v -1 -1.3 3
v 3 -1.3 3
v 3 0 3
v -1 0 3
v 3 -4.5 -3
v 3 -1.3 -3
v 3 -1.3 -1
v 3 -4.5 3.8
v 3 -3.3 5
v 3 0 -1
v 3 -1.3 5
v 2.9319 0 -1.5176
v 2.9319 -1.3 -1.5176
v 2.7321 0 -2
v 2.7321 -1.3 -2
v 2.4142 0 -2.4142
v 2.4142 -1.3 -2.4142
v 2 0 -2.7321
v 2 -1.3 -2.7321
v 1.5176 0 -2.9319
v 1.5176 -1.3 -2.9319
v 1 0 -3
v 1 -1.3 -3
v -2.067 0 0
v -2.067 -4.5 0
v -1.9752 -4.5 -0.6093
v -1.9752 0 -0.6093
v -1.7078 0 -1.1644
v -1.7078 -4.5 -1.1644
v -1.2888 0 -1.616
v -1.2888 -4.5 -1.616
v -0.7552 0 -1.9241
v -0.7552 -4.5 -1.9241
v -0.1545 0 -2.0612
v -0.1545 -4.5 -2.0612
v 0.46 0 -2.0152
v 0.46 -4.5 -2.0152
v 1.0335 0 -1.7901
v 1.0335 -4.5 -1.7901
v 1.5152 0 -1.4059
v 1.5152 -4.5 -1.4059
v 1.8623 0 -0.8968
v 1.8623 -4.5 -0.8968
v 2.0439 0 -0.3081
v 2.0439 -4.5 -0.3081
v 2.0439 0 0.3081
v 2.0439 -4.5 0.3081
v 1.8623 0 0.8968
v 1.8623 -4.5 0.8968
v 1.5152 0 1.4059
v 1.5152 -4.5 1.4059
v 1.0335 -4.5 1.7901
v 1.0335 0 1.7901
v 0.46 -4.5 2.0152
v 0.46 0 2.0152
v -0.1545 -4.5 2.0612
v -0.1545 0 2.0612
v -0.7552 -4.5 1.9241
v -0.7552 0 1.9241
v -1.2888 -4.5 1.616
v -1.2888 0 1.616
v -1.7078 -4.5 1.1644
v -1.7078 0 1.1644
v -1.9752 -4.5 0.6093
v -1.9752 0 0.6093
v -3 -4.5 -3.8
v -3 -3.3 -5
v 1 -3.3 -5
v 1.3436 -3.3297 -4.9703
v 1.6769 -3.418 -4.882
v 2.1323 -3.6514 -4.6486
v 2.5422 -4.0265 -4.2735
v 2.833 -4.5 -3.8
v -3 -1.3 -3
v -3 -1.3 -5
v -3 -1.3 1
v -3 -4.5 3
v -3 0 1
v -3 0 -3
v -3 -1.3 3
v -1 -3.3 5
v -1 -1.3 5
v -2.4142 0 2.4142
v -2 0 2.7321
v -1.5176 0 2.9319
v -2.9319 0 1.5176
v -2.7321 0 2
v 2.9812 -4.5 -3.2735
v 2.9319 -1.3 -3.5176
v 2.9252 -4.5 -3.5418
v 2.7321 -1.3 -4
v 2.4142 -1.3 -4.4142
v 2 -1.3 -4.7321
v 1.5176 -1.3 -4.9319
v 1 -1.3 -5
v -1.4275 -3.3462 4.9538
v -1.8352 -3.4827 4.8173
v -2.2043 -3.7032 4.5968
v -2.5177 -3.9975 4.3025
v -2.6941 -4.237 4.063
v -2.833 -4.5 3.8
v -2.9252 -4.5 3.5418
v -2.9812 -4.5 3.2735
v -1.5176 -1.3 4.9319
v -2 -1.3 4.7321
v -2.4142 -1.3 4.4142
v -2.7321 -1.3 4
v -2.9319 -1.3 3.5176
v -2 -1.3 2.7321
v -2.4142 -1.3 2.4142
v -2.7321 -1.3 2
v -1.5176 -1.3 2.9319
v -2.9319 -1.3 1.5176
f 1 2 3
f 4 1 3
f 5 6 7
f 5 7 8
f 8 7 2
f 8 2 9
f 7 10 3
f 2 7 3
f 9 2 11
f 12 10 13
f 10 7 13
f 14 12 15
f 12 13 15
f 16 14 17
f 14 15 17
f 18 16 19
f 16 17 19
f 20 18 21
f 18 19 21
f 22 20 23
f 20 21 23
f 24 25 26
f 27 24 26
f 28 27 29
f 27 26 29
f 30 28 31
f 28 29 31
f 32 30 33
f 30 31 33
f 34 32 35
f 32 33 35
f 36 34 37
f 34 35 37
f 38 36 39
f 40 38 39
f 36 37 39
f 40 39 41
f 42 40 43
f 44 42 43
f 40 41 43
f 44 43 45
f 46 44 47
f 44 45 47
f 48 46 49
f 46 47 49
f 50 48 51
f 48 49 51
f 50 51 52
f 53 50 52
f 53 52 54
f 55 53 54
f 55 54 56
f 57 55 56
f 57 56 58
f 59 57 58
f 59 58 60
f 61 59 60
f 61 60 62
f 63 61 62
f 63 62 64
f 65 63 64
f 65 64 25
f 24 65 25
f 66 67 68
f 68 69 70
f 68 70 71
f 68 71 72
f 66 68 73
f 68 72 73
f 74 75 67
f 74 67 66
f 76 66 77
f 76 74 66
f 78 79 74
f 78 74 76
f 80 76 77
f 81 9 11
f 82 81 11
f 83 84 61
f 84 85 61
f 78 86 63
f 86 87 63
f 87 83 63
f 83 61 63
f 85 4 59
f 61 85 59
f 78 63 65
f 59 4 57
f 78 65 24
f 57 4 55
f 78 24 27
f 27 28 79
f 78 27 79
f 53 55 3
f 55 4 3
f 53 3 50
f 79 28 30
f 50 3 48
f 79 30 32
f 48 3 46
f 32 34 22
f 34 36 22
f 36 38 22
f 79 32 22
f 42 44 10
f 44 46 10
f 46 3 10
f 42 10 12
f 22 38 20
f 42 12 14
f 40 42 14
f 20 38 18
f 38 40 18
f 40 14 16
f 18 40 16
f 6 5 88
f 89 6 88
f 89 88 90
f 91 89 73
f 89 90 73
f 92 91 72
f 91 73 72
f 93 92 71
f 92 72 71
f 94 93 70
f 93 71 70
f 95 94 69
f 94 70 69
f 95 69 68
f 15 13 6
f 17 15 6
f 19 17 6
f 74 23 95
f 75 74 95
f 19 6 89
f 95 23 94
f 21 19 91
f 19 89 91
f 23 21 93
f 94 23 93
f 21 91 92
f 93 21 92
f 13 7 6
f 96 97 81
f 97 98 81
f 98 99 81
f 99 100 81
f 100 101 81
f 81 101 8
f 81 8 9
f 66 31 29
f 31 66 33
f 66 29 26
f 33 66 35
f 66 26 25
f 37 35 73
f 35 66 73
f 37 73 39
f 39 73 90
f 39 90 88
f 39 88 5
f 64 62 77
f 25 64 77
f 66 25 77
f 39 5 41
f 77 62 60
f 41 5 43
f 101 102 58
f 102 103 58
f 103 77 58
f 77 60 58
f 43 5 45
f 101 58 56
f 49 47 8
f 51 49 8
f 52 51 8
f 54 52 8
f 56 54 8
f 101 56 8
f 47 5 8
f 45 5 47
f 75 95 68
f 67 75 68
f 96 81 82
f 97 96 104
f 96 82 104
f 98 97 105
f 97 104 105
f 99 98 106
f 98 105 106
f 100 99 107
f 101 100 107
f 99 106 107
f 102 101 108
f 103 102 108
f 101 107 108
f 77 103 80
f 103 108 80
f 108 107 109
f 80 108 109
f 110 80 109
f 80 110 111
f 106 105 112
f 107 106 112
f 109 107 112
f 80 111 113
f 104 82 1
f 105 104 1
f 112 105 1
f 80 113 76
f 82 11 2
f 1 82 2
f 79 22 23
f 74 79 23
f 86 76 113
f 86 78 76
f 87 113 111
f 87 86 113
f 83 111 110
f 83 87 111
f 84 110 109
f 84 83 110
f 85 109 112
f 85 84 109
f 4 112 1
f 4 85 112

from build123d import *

# Parameters (mm, degrees)
BOSS_EXTRUDE1_DEPTH = 3
FILLET1_R           = 2
TAP1_D              = 4.134


with BuildPart() as part:
    # Sketch1 → Boss-Extrude1 (new body, symmetric)
    with BuildSketch(Plane(origin=(0, 0, 0), x_dir=(0, 0, -1), z_dir=(1, 0, 0))):
        Polygon((-3, 0), (3, 0), (3, -1.3), (5, -1.3), (5, -3.3), (3.8, -4.5), (-3.8, -4.5), (-5, -3.3), (-5, -1.3), (-3, -1.3), align=None)
    extrude(amount=BOSS_EXTRUDE1_DEPTH, both=True)

    # Fillet1
    fillet1_edges = [part.edges().sort_by_distance(p)[0] for p in [
        (3, -2.3, -5),
        (-3, -2.3, 5),
        (3, -0.65, -3),
        (-3, -0.65, 3),
    ]]
    fillet(fillet1_edges, radius=FILLET1_R)

    # Tap1 (through all)
    with Locations(Plane(origin=(0, 0, 0), x_dir=(1, 0, 0), z_dir=(0, 1, 0))):
        with Locations((0, 0)):
            Hole(TAP1_D / 2)


solid = part.part
